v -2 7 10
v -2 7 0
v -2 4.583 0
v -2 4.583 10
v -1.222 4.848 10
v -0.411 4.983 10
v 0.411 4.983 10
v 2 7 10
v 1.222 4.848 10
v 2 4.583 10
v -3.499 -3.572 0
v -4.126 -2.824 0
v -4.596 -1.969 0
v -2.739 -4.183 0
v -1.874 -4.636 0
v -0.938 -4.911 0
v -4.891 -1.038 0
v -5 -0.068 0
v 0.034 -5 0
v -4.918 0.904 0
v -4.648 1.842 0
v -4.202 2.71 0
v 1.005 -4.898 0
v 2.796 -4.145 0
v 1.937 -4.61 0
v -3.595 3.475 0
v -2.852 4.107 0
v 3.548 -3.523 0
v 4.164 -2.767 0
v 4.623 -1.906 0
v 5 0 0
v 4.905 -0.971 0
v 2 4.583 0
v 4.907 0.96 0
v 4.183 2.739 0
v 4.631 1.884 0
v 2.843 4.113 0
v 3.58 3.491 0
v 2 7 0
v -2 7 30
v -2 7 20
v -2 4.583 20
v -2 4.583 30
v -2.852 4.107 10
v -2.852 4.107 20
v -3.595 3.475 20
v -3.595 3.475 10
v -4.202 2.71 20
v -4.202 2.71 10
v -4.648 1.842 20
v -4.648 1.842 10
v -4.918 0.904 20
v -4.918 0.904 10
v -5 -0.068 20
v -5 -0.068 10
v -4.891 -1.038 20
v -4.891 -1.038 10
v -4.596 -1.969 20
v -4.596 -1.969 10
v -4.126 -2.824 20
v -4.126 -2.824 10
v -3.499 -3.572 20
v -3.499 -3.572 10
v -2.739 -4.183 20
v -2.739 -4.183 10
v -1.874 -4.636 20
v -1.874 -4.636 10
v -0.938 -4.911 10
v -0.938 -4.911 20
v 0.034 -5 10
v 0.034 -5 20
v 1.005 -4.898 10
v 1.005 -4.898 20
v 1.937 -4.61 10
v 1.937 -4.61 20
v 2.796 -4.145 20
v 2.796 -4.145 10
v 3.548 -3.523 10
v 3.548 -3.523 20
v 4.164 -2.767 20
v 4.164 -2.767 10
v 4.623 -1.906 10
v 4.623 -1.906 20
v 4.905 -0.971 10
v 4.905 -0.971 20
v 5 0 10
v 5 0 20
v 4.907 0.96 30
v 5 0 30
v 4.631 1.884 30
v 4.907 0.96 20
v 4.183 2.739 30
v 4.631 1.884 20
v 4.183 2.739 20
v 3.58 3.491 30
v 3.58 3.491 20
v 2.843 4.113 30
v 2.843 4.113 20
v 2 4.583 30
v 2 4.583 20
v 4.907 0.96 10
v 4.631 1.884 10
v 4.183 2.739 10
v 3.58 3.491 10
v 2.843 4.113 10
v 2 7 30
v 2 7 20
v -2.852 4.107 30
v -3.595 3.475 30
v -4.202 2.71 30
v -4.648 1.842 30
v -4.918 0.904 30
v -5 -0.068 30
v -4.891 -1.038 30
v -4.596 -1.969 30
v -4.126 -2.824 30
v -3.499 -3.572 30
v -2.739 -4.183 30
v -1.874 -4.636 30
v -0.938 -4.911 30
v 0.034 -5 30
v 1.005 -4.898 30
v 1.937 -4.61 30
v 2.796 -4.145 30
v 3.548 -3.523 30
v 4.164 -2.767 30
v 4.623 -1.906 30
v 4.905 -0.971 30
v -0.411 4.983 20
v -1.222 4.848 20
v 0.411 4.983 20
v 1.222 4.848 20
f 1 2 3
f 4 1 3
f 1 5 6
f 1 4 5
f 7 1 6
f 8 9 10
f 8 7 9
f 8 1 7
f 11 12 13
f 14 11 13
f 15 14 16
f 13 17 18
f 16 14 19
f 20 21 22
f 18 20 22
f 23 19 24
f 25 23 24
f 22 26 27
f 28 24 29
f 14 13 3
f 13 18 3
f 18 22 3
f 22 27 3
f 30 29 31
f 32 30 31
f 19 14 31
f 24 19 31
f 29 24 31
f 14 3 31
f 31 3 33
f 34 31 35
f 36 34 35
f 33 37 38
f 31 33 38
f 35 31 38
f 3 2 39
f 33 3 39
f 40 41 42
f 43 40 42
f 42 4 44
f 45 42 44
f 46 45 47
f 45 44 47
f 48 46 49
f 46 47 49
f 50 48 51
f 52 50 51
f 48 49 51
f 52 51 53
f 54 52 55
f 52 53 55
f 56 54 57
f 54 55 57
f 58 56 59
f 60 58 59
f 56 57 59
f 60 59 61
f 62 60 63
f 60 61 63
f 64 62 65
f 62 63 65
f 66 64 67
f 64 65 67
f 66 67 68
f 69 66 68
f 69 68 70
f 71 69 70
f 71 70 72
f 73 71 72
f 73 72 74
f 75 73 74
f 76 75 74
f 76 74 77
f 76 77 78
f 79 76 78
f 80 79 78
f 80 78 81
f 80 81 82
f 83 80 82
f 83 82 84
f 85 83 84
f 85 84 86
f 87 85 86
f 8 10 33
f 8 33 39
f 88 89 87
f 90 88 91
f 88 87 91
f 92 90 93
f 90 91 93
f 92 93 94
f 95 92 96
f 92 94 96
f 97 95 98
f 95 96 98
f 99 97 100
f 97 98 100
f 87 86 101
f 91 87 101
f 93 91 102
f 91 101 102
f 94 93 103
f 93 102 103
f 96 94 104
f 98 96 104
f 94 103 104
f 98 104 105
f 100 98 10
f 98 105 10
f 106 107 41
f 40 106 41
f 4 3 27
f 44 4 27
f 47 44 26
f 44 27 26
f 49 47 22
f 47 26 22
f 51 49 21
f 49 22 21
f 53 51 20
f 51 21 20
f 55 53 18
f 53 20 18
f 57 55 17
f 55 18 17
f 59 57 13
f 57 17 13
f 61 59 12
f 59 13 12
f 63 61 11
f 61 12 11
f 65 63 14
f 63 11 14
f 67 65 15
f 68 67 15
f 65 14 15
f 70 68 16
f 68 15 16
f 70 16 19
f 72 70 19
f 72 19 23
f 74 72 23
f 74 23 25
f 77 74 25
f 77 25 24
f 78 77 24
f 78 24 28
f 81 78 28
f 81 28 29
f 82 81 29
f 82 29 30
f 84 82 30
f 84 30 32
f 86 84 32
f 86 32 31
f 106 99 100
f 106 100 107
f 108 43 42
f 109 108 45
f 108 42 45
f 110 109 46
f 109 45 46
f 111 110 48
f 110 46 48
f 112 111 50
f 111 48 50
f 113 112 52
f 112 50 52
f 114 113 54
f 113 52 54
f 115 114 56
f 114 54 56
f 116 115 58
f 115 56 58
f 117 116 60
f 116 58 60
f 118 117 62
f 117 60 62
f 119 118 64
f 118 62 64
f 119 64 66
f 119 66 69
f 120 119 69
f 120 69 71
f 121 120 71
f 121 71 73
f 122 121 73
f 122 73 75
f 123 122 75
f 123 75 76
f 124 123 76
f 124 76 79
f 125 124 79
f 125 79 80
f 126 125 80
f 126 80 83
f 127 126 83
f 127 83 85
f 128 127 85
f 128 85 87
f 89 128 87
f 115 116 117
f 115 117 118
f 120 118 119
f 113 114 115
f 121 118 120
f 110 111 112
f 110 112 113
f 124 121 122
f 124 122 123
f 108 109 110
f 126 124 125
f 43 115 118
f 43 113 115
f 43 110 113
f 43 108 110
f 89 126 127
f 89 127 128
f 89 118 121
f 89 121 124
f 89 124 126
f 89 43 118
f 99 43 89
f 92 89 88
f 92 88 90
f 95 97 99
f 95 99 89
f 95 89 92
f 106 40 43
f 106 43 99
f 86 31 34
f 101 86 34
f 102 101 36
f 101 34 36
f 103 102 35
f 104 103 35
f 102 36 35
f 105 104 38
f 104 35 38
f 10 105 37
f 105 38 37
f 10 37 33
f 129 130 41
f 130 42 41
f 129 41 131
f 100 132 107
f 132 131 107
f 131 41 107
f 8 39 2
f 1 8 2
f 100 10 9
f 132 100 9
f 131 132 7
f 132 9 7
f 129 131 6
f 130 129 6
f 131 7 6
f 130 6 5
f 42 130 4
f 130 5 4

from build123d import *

# Parameters (mm, degrees)
BOSS_EXTRUDE1_DEPTH = 30
CUT_EXTRUDE1_START  = -20
SKETCH2_R           = 10
SKETCH2_R_2         = 5
CUT_EXTRUDE1_DEPTH  = 10


with BuildPart() as part:
    # Sketch1 → Boss-Extrude1 (new body)
    with BuildSketch(Plane.XY):
        with BuildLine():
            Line((2, 7), (-2, 7))
            Line((-2, 7), (-2, 4.582575695))
            ThreePointArc((-2, 4.582575695), (0, -5), (2, 4.582575695))
            Line((2, 4.582575695), (2, 7))
        make_face()
    extrude(amount=BOSS_EXTRUDE1_DEPTH)

    # Sketch2 → Cut-Extrude1 (cut)
    with BuildSketch(Plane.XY.offset(30).offset(CUT_EXTRUDE1_START)):
        Circle(SKETCH2_R)
        Circle(SKETCH2_R_2, mode=Mode.SUBTRACT)
    extrude(amount=CUT_EXTRUDE1_DEPTH, mode=Mode.SUBTRACT)


solid = part.part
